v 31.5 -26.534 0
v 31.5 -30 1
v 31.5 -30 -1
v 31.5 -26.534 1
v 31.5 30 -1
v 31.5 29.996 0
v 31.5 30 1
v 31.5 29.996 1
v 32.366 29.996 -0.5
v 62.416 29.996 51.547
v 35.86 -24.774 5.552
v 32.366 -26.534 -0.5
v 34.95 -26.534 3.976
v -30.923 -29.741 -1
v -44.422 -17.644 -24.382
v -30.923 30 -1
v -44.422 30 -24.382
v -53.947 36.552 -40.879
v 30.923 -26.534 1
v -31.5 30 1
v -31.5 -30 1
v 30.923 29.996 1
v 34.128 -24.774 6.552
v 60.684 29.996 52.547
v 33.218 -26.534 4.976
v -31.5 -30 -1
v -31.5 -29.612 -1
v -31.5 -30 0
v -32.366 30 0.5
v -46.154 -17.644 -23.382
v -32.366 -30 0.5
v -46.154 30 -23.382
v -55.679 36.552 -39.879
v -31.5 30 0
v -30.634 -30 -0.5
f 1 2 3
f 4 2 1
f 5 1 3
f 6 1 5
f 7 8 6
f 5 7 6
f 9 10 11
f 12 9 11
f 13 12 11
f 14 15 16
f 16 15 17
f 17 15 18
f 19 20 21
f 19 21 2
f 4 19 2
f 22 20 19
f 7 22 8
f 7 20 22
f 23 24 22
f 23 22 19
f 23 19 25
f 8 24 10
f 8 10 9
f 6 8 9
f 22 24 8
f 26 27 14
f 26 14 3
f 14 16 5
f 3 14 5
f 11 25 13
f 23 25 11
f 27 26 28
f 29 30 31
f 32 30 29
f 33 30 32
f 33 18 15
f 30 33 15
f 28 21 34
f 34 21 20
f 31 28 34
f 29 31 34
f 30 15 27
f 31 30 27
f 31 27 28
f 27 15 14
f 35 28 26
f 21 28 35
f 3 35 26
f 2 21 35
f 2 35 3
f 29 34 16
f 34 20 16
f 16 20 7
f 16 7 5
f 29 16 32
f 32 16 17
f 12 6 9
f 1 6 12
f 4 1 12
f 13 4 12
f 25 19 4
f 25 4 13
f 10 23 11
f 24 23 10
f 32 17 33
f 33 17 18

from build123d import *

# Parameters (mm, degrees)
ESBO_O1_W                = 63
ESBO_O1_H                = 60
RESSALTO_EXTRUS_O1_DEPTH = 1
RESSALTO_EXTRUS_O2_DEPTH = 1
RESSALTO_EXTRUS_O3_DEPTH = 1


with BuildPart() as part:
    # Esboço1 → Ressalto-extrusão1 (new, symmetric)
    with BuildSketch(Plane.XY):
        Rectangle(ESBO_O1_W, ESBO_O1_H)
    extrude(amount=RESSALTO_EXTRUS_O1_DEPTH, both=True)

    # Esboço2 → Ressalto-extrusão2 (add, symmetric)
    with BuildSketch(Plane(origin=(23.625, 0, -13.63990011), x_dir=(0, -1, 0), z_dir=(-0.8660254037844416, 0, 0.49999999999999495))):
        Polygon((-29.995618948, 75.849181721), (-29.995618948, 15.75), (26.534381052, 15.75), (26.534381052, 20.91864534), (24.774381052, 22.73864534), align=None)
    extrude(amount=RESSALTO_EXTRUS_O2_DEPTH, both=True)

    # Esboço3 → Ressalto-extrusão3 (add, symmetric)
    with BuildSketch(Plane(origin=(-23.625, 0, 13.63990011), x_dir=(0, -1, 0), z_dir=(0.866025403784445, 0, -0.4999999999999889))):
        Polygon((30, 15.75), (-30, 15.75), (-30, 43.326372281), (-36.552202997, 62.375919638), (17.643604412, 43.326372281), align=None)
    extrude(amount=RESSALTO_EXTRUS_O3_DEPTH, both=True)


solid = part.part
